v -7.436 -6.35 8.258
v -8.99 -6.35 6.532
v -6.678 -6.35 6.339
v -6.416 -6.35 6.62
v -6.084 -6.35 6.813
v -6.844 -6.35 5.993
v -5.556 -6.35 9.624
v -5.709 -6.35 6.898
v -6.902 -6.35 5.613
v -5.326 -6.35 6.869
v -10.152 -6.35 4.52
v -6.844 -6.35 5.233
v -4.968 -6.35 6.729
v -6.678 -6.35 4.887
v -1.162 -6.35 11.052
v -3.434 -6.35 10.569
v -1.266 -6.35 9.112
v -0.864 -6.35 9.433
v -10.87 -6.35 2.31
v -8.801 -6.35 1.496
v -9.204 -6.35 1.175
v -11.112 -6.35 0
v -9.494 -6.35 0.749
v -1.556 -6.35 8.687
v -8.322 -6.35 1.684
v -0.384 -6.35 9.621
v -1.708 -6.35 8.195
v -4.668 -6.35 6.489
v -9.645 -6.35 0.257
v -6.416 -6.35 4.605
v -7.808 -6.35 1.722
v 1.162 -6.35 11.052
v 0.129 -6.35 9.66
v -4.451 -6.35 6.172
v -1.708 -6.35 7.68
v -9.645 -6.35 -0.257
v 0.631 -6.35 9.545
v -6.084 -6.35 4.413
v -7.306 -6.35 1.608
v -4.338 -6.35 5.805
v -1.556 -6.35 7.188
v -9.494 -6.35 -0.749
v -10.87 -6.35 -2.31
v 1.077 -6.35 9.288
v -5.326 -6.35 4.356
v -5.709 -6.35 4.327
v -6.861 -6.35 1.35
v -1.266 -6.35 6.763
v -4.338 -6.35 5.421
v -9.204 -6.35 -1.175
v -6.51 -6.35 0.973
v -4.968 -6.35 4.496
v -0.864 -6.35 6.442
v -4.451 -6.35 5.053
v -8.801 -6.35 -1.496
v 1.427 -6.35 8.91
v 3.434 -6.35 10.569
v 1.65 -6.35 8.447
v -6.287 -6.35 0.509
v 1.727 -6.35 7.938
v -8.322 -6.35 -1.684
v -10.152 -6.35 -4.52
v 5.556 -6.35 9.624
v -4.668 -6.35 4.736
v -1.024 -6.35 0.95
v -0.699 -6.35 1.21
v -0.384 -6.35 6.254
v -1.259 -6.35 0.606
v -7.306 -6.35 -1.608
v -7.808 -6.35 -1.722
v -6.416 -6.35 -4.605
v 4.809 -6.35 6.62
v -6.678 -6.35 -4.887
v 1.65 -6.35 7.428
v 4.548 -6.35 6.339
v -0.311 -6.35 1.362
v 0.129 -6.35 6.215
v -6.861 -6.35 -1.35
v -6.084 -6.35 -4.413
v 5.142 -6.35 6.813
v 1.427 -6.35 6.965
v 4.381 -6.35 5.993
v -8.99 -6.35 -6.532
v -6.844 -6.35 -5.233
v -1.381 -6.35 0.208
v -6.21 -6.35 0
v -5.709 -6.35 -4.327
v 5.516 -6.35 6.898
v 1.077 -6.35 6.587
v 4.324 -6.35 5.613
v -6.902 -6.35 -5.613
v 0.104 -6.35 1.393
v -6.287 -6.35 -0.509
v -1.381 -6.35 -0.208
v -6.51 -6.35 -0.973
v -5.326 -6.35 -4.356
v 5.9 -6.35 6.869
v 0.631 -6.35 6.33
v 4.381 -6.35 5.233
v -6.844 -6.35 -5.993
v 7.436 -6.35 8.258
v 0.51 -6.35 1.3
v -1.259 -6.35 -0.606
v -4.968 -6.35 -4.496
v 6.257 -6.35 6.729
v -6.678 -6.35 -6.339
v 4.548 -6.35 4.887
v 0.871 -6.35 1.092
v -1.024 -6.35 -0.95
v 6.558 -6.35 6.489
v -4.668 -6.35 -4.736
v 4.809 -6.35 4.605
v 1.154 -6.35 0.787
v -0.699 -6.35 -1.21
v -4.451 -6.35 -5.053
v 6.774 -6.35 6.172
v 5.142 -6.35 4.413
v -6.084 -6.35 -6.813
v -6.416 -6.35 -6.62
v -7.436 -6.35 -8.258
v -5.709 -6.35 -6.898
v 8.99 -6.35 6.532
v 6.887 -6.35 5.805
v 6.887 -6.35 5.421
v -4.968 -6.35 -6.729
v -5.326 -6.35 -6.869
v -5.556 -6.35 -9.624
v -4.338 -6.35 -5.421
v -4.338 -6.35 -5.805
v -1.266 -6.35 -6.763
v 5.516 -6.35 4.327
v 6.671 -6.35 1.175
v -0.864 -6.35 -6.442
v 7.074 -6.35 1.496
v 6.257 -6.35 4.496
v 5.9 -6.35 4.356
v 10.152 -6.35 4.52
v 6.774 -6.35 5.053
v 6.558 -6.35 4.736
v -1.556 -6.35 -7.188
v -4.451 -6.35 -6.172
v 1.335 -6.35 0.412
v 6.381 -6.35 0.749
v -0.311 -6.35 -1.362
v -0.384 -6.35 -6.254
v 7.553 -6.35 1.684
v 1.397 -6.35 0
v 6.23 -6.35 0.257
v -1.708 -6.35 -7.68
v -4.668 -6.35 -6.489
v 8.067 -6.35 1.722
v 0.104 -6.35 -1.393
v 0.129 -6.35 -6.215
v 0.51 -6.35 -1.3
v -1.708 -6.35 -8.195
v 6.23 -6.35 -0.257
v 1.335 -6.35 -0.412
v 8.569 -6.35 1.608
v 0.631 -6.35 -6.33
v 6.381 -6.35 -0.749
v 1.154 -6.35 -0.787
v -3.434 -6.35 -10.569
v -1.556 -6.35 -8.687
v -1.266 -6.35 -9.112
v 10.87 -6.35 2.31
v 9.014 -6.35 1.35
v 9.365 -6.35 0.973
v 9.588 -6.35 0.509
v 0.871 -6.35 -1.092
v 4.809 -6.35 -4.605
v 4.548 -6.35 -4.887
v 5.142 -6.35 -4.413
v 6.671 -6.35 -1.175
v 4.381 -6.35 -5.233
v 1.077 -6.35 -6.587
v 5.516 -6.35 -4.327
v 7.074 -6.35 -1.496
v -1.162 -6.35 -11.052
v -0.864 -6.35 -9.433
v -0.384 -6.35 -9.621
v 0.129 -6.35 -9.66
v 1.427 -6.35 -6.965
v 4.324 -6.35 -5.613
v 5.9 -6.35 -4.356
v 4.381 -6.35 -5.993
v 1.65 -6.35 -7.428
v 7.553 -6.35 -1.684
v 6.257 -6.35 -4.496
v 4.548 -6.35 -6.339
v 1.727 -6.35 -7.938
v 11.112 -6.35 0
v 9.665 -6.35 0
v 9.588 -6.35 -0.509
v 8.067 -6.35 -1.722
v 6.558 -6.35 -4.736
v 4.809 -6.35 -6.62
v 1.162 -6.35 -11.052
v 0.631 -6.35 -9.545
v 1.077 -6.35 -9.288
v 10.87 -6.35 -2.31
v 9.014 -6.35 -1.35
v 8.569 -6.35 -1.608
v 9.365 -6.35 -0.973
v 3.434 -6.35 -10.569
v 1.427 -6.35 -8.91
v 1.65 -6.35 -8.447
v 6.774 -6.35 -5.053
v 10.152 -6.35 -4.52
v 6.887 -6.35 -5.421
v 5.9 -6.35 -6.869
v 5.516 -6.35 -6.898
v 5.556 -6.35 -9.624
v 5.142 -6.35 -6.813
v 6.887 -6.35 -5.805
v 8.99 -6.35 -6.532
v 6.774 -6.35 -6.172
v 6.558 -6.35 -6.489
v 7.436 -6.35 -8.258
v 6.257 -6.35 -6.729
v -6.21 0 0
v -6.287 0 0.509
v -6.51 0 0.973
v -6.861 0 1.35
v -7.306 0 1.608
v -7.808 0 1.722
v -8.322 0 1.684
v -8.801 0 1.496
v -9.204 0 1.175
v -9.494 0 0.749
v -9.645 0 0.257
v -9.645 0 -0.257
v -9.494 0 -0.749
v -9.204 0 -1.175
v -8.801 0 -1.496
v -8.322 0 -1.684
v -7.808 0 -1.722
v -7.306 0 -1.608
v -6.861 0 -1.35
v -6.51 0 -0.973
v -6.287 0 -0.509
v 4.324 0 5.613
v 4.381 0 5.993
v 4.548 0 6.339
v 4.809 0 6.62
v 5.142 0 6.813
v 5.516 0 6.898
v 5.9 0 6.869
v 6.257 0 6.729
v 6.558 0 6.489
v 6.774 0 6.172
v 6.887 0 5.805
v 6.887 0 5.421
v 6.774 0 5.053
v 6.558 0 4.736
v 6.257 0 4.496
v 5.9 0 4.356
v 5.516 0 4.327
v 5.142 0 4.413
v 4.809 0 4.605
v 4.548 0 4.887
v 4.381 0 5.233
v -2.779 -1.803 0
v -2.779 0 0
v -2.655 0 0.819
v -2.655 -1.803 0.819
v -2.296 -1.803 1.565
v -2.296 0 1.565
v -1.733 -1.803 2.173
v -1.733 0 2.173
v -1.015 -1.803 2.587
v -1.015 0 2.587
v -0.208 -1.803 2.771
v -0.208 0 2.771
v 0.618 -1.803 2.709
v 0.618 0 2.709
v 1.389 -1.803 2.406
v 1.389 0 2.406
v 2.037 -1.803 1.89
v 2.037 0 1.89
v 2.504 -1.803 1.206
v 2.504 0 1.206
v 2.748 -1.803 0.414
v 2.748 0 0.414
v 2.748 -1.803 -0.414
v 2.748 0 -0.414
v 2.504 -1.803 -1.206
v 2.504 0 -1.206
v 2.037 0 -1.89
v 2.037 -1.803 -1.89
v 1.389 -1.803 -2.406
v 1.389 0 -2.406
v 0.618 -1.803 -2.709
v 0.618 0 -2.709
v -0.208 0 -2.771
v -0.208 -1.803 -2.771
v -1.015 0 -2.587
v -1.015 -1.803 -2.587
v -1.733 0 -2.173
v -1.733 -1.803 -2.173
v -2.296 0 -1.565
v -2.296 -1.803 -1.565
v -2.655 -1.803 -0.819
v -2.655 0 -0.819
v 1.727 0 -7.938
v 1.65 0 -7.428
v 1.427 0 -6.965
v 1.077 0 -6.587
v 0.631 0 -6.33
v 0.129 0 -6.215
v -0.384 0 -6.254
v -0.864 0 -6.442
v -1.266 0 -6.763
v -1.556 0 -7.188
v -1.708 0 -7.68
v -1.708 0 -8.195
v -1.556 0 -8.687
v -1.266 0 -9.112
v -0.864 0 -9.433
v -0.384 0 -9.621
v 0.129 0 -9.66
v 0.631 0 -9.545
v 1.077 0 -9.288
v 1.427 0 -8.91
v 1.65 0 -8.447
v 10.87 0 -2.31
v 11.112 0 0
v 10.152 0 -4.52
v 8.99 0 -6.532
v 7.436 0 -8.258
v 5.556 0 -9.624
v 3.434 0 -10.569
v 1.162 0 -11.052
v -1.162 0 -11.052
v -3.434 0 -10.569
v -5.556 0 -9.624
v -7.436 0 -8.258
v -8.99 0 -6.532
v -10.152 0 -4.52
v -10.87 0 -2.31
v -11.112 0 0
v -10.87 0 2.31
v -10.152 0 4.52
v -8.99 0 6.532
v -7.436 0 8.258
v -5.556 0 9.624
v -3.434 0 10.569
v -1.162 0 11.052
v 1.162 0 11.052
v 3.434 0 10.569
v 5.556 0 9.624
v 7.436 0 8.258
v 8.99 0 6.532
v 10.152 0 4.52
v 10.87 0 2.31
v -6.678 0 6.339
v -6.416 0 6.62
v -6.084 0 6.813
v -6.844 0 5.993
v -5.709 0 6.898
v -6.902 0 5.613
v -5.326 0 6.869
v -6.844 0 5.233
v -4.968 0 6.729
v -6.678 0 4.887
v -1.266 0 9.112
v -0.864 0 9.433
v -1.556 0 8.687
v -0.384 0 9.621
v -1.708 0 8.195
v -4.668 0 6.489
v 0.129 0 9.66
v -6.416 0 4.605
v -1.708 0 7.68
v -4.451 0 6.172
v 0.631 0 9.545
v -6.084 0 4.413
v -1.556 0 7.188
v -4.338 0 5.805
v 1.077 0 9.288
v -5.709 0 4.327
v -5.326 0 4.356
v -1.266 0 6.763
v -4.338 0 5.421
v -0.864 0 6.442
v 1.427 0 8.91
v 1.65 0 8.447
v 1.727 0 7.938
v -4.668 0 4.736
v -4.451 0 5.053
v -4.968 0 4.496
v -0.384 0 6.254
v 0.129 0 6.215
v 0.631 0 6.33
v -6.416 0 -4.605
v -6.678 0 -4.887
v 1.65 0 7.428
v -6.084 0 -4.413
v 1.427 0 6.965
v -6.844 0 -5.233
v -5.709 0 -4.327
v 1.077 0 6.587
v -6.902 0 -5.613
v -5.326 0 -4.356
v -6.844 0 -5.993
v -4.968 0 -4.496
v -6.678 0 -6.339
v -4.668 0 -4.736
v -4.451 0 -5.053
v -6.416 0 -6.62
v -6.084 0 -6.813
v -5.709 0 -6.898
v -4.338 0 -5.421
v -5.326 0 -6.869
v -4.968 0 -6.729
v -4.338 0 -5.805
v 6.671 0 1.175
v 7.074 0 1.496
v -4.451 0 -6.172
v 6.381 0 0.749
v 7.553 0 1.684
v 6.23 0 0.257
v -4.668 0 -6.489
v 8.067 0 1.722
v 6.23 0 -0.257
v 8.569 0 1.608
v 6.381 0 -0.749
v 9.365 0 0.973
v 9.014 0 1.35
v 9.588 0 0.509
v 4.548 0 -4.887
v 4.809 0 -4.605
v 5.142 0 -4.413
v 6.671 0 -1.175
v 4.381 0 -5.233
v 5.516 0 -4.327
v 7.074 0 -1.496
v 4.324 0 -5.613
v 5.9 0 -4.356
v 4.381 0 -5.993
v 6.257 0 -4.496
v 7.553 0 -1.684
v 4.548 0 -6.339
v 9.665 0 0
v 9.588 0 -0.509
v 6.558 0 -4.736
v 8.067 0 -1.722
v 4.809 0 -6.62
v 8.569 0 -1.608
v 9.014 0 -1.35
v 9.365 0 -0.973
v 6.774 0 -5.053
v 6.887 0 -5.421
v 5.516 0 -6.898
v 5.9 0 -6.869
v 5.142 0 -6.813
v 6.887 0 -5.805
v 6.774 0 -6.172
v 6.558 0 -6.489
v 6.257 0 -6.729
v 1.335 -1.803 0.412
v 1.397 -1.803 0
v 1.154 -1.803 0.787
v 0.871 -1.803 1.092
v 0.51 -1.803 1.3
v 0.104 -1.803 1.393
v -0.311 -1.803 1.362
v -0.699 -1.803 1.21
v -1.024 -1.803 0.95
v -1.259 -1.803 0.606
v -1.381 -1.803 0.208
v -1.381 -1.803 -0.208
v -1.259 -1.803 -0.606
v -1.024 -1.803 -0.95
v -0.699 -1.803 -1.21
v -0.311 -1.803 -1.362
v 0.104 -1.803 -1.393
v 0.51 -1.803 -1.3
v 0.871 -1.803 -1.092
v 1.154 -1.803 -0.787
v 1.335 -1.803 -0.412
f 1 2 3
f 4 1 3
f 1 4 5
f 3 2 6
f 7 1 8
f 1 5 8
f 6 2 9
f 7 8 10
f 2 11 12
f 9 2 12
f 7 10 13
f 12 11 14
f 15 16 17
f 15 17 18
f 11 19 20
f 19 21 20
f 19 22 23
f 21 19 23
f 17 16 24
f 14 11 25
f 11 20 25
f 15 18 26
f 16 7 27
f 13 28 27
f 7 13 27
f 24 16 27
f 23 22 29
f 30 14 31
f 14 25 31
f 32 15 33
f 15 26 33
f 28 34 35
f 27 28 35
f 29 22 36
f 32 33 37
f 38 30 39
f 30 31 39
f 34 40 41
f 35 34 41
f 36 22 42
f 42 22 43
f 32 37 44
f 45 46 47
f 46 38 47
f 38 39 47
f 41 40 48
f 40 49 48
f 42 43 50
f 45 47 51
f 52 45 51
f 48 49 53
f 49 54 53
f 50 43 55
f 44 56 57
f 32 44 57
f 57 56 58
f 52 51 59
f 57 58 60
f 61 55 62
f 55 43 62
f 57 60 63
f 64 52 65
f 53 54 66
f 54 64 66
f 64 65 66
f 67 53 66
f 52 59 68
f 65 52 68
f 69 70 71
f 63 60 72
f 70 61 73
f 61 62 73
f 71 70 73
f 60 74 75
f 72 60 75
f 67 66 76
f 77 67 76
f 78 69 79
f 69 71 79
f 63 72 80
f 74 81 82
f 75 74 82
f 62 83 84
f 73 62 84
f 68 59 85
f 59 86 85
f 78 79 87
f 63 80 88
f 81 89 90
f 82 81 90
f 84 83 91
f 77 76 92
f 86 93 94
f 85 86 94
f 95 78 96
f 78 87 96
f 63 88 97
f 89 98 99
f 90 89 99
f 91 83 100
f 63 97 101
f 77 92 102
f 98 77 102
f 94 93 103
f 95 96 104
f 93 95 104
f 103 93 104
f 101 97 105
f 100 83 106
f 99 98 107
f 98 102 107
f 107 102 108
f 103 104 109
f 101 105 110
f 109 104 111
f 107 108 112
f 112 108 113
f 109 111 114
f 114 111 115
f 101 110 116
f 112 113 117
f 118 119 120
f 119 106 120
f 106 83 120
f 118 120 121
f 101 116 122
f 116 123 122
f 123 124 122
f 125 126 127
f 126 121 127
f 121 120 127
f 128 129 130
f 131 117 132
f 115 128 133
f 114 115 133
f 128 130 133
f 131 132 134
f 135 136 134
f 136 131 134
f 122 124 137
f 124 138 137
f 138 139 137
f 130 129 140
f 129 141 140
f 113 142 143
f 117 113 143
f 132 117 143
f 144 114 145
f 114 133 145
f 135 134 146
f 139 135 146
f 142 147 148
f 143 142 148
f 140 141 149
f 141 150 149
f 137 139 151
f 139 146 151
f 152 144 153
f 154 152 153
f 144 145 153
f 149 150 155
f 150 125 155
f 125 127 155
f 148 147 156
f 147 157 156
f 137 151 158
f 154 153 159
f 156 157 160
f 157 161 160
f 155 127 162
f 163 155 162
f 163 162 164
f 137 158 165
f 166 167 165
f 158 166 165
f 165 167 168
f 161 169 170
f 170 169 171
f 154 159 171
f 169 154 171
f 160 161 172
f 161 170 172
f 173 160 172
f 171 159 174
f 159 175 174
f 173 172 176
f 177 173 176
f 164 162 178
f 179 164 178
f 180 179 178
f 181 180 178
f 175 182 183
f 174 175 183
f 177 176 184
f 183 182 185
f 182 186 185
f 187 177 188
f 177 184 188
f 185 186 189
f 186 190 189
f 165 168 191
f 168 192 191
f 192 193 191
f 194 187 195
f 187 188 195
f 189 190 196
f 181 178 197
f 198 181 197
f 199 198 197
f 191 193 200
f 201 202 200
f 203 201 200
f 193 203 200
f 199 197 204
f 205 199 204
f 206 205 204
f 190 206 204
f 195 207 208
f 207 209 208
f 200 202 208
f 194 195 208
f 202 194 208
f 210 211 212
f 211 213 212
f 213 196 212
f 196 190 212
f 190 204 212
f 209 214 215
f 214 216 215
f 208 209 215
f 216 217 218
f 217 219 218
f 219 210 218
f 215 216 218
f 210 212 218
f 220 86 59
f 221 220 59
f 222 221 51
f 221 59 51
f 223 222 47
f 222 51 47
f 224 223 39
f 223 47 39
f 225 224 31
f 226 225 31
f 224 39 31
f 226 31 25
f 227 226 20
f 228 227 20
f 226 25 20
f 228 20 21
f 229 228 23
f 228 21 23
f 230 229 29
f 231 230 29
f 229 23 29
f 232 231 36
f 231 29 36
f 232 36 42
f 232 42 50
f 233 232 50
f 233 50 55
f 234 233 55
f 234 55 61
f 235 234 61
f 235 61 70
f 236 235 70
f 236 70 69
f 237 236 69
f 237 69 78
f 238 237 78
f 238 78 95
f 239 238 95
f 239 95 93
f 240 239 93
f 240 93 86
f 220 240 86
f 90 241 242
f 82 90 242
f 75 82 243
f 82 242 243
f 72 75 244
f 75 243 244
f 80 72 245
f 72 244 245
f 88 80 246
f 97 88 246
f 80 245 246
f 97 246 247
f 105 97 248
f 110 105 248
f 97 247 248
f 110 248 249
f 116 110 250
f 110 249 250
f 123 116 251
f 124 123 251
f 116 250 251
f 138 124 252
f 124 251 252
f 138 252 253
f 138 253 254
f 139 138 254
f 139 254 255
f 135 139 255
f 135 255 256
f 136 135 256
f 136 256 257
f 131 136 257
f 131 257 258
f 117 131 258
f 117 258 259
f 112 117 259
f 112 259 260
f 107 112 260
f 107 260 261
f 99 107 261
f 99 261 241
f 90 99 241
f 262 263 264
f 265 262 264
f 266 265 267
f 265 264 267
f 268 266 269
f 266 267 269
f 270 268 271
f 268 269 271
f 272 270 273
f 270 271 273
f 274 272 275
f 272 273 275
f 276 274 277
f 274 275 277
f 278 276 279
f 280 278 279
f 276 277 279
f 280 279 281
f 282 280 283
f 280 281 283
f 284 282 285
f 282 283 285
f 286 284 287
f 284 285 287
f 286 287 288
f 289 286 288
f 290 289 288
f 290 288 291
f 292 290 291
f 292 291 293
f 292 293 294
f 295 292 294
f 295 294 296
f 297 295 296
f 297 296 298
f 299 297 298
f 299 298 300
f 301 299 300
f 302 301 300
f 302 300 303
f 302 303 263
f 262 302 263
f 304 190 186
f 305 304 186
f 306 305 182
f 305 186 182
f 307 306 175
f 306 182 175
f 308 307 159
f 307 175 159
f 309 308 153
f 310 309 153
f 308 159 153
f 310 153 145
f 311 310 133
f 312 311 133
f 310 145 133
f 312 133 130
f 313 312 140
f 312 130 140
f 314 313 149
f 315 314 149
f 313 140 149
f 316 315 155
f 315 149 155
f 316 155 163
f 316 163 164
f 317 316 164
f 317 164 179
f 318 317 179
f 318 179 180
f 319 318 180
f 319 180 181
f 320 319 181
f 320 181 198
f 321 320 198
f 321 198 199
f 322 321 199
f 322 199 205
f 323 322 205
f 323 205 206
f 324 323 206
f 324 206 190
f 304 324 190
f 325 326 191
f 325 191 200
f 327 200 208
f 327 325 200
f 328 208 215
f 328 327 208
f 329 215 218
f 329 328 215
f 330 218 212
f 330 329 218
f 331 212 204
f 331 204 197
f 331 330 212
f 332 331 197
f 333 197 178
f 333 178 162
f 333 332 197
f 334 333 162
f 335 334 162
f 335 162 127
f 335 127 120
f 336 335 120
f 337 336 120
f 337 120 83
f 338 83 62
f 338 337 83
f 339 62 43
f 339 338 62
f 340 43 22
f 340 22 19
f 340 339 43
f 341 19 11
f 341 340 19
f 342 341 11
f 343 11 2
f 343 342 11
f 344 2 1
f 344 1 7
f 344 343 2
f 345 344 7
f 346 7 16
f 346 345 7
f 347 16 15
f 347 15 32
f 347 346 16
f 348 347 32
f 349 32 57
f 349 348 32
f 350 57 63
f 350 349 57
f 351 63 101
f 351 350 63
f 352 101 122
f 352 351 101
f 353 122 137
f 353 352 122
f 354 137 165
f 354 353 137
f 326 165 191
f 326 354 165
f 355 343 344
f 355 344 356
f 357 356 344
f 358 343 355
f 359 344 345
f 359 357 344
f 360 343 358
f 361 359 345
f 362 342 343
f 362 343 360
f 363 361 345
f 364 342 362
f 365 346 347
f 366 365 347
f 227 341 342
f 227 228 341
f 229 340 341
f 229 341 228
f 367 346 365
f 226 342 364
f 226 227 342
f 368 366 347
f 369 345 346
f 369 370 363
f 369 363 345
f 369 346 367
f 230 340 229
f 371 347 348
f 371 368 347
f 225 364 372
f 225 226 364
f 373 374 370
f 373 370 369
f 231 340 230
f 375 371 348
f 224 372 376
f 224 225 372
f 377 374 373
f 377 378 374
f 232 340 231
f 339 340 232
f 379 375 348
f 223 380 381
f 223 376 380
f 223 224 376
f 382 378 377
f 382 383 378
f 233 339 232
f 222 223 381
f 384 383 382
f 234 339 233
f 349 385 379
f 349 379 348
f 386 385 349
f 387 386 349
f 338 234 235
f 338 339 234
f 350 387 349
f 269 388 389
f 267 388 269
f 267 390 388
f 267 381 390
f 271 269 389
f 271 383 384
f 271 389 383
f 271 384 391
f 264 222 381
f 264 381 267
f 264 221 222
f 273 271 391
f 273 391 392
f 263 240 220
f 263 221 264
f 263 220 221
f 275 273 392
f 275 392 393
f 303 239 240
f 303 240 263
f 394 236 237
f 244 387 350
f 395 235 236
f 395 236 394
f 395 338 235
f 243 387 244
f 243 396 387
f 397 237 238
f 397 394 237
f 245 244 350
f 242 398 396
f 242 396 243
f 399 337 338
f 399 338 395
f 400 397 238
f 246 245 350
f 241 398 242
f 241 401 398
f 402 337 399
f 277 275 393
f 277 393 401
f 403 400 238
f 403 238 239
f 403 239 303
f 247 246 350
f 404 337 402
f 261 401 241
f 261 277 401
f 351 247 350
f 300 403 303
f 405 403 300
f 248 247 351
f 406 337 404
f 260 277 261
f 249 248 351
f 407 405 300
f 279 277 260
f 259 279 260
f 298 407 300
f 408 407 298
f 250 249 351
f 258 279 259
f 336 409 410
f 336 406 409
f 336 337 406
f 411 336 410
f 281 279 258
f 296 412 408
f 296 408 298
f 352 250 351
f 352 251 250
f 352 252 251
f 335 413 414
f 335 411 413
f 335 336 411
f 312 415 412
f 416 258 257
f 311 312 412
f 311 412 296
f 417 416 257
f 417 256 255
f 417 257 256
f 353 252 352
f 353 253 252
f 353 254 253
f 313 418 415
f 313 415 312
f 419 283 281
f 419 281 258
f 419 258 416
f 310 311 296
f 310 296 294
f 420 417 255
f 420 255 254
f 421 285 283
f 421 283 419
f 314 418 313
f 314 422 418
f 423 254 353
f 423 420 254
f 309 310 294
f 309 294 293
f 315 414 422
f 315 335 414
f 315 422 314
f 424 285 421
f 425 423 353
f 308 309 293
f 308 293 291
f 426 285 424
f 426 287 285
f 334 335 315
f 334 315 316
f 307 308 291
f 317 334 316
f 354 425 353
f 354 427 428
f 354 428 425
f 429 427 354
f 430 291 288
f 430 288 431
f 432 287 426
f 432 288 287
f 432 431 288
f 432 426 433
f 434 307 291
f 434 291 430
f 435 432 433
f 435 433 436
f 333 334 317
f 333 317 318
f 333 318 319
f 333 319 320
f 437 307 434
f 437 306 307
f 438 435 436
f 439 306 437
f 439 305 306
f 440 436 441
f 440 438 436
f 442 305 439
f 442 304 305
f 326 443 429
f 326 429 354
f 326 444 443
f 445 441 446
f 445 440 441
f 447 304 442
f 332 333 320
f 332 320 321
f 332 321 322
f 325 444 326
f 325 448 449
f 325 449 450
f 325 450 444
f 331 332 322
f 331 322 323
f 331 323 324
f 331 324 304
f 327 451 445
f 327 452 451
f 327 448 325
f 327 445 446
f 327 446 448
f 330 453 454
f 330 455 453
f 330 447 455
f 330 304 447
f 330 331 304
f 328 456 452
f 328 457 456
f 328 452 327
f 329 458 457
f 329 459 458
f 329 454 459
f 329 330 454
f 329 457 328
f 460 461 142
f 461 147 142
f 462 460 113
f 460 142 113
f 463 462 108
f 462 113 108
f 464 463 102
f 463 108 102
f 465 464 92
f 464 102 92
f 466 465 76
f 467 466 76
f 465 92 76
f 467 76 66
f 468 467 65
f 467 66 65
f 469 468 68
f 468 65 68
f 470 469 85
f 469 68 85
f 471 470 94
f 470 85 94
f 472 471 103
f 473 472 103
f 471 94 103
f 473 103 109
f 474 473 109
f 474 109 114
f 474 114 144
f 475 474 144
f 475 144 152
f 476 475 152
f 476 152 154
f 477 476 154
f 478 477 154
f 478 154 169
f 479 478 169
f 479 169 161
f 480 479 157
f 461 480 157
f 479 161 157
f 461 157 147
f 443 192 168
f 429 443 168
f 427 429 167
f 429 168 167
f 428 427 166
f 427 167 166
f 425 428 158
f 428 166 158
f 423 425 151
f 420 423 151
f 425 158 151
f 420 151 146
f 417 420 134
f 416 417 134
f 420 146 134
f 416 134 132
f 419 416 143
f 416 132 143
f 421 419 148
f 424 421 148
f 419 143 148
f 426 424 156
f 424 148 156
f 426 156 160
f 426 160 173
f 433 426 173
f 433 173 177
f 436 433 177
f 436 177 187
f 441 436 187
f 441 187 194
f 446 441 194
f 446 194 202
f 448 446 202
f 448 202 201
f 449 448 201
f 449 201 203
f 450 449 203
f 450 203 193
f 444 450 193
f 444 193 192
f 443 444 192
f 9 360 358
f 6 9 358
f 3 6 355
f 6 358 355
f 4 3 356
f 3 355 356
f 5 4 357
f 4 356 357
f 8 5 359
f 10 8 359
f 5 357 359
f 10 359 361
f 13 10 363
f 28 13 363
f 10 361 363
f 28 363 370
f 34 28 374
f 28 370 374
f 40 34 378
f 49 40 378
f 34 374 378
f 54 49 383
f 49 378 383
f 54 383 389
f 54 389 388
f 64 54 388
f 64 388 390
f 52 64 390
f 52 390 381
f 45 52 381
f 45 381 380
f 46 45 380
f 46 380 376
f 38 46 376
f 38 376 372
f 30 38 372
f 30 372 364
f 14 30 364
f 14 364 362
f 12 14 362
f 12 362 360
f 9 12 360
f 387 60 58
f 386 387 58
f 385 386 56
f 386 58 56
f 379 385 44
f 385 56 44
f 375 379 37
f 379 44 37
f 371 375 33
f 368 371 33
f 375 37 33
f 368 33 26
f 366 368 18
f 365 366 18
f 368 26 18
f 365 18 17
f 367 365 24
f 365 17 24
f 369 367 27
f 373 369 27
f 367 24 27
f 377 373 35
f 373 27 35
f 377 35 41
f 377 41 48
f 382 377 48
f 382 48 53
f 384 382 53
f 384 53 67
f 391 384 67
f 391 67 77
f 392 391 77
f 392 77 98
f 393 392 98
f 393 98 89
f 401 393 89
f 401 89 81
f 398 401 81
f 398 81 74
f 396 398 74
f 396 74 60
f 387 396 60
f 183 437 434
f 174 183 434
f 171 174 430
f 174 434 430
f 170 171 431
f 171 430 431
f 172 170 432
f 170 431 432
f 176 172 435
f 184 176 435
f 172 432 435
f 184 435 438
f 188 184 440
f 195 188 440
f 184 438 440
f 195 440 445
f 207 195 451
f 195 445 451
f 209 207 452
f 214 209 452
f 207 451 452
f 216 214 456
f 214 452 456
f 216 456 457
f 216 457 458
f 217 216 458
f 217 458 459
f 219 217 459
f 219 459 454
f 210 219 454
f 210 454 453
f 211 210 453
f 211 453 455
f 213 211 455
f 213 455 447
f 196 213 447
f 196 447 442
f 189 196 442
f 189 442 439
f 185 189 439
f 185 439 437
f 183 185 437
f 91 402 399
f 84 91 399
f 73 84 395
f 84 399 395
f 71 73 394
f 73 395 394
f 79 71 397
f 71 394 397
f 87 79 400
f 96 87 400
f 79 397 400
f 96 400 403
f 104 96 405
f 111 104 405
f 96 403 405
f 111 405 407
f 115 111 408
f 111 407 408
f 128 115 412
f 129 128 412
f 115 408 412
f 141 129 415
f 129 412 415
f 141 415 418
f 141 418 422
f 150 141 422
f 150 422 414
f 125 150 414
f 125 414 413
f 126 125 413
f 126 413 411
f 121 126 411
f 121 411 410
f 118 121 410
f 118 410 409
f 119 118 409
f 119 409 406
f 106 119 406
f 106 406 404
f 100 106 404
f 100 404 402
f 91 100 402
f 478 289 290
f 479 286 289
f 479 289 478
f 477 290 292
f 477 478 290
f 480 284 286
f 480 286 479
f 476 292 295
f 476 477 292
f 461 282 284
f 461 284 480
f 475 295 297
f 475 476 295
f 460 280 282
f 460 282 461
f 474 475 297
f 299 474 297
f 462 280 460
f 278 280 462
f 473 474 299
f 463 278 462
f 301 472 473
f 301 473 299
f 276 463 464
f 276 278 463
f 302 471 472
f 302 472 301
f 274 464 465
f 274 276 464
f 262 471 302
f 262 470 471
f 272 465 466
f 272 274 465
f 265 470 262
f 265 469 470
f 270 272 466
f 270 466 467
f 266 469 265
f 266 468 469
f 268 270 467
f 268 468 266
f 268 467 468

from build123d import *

# Parameters (mm, degrees)
SKETCH1_R                                        = 11.1125
EXTRUDE1_DEPTH                                   = 6.35
D_GAGEMENT_51_D                                  = 3.4544
TROU_POUR_TARAUDAGE_POUR_TROU_TARAUD_5_D         = 2.5781
CHAMBRAGE_POUR_VIS_T_TE_RONDE_BOMB_E_D           = 2.794
CHAMBRAGE_POUR_VIS_T_TE_RONDE_BOMB_E_CBORE_D     = 5.55752
CHAMBRAGE_POUR_VIS_T_TE_RONDE_BOMB_E_CBORE_DEPTH = 1.8034


with BuildPart() as part:
    # Sketch1 → Extrude1 (new body)
    with BuildSketch(Plane(origin=(0, 0, 0), x_dir=(1, 0, 0), z_dir=(0, 1, 0))):
        Circle(SKETCH1_R)
    extrude(amount=-EXTRUDE1_DEPTH)

    # Dégagement #51 (through all)
    with Locations(Plane(origin=(0, 0, 0), x_dir=(-1, 0, 0), z_dir=(0, 1, 0))):
        with Locations((7.9375, 0), (0, -7.9375), (-7.9375, 0), (0, 7.9375)):
            Hole(D_GAGEMENT_51_D / 2)

    # Trou pour taraudage pour trou taraudé #5-401 (through all)
    with Locations(Plane.XZ.offset(6.35)):
        with Locations((-5.612660076, -5.612660076), (5.612660076, -5.612660076), (5.612660076, 5.612660076), (-5.612660076, 5.612660076)):
            Hole(TROU_POUR_TARAUDAGE_POUR_TROU_TARAUD_5_D / 2)

    # Chambrage pour vis à tête ronde bombée #31 (through all)
    with Locations(Plane(origin=(0, 0, 0), x_dir=(-1, 0, 0), z_dir=(0, 1, 0))):
        with Locations((0, 0)):
            CounterBoreHole(CHAMBRAGE_POUR_VIS_T_TE_RONDE_BOMB_E_D / 2, CHAMBRAGE_POUR_VIS_T_TE_RONDE_BOMB_E_CBORE_D / 2, CHAMBRAGE_POUR_VIS_T_TE_RONDE_BOMB_E_CBORE_DEPTH)


solid = part.part
